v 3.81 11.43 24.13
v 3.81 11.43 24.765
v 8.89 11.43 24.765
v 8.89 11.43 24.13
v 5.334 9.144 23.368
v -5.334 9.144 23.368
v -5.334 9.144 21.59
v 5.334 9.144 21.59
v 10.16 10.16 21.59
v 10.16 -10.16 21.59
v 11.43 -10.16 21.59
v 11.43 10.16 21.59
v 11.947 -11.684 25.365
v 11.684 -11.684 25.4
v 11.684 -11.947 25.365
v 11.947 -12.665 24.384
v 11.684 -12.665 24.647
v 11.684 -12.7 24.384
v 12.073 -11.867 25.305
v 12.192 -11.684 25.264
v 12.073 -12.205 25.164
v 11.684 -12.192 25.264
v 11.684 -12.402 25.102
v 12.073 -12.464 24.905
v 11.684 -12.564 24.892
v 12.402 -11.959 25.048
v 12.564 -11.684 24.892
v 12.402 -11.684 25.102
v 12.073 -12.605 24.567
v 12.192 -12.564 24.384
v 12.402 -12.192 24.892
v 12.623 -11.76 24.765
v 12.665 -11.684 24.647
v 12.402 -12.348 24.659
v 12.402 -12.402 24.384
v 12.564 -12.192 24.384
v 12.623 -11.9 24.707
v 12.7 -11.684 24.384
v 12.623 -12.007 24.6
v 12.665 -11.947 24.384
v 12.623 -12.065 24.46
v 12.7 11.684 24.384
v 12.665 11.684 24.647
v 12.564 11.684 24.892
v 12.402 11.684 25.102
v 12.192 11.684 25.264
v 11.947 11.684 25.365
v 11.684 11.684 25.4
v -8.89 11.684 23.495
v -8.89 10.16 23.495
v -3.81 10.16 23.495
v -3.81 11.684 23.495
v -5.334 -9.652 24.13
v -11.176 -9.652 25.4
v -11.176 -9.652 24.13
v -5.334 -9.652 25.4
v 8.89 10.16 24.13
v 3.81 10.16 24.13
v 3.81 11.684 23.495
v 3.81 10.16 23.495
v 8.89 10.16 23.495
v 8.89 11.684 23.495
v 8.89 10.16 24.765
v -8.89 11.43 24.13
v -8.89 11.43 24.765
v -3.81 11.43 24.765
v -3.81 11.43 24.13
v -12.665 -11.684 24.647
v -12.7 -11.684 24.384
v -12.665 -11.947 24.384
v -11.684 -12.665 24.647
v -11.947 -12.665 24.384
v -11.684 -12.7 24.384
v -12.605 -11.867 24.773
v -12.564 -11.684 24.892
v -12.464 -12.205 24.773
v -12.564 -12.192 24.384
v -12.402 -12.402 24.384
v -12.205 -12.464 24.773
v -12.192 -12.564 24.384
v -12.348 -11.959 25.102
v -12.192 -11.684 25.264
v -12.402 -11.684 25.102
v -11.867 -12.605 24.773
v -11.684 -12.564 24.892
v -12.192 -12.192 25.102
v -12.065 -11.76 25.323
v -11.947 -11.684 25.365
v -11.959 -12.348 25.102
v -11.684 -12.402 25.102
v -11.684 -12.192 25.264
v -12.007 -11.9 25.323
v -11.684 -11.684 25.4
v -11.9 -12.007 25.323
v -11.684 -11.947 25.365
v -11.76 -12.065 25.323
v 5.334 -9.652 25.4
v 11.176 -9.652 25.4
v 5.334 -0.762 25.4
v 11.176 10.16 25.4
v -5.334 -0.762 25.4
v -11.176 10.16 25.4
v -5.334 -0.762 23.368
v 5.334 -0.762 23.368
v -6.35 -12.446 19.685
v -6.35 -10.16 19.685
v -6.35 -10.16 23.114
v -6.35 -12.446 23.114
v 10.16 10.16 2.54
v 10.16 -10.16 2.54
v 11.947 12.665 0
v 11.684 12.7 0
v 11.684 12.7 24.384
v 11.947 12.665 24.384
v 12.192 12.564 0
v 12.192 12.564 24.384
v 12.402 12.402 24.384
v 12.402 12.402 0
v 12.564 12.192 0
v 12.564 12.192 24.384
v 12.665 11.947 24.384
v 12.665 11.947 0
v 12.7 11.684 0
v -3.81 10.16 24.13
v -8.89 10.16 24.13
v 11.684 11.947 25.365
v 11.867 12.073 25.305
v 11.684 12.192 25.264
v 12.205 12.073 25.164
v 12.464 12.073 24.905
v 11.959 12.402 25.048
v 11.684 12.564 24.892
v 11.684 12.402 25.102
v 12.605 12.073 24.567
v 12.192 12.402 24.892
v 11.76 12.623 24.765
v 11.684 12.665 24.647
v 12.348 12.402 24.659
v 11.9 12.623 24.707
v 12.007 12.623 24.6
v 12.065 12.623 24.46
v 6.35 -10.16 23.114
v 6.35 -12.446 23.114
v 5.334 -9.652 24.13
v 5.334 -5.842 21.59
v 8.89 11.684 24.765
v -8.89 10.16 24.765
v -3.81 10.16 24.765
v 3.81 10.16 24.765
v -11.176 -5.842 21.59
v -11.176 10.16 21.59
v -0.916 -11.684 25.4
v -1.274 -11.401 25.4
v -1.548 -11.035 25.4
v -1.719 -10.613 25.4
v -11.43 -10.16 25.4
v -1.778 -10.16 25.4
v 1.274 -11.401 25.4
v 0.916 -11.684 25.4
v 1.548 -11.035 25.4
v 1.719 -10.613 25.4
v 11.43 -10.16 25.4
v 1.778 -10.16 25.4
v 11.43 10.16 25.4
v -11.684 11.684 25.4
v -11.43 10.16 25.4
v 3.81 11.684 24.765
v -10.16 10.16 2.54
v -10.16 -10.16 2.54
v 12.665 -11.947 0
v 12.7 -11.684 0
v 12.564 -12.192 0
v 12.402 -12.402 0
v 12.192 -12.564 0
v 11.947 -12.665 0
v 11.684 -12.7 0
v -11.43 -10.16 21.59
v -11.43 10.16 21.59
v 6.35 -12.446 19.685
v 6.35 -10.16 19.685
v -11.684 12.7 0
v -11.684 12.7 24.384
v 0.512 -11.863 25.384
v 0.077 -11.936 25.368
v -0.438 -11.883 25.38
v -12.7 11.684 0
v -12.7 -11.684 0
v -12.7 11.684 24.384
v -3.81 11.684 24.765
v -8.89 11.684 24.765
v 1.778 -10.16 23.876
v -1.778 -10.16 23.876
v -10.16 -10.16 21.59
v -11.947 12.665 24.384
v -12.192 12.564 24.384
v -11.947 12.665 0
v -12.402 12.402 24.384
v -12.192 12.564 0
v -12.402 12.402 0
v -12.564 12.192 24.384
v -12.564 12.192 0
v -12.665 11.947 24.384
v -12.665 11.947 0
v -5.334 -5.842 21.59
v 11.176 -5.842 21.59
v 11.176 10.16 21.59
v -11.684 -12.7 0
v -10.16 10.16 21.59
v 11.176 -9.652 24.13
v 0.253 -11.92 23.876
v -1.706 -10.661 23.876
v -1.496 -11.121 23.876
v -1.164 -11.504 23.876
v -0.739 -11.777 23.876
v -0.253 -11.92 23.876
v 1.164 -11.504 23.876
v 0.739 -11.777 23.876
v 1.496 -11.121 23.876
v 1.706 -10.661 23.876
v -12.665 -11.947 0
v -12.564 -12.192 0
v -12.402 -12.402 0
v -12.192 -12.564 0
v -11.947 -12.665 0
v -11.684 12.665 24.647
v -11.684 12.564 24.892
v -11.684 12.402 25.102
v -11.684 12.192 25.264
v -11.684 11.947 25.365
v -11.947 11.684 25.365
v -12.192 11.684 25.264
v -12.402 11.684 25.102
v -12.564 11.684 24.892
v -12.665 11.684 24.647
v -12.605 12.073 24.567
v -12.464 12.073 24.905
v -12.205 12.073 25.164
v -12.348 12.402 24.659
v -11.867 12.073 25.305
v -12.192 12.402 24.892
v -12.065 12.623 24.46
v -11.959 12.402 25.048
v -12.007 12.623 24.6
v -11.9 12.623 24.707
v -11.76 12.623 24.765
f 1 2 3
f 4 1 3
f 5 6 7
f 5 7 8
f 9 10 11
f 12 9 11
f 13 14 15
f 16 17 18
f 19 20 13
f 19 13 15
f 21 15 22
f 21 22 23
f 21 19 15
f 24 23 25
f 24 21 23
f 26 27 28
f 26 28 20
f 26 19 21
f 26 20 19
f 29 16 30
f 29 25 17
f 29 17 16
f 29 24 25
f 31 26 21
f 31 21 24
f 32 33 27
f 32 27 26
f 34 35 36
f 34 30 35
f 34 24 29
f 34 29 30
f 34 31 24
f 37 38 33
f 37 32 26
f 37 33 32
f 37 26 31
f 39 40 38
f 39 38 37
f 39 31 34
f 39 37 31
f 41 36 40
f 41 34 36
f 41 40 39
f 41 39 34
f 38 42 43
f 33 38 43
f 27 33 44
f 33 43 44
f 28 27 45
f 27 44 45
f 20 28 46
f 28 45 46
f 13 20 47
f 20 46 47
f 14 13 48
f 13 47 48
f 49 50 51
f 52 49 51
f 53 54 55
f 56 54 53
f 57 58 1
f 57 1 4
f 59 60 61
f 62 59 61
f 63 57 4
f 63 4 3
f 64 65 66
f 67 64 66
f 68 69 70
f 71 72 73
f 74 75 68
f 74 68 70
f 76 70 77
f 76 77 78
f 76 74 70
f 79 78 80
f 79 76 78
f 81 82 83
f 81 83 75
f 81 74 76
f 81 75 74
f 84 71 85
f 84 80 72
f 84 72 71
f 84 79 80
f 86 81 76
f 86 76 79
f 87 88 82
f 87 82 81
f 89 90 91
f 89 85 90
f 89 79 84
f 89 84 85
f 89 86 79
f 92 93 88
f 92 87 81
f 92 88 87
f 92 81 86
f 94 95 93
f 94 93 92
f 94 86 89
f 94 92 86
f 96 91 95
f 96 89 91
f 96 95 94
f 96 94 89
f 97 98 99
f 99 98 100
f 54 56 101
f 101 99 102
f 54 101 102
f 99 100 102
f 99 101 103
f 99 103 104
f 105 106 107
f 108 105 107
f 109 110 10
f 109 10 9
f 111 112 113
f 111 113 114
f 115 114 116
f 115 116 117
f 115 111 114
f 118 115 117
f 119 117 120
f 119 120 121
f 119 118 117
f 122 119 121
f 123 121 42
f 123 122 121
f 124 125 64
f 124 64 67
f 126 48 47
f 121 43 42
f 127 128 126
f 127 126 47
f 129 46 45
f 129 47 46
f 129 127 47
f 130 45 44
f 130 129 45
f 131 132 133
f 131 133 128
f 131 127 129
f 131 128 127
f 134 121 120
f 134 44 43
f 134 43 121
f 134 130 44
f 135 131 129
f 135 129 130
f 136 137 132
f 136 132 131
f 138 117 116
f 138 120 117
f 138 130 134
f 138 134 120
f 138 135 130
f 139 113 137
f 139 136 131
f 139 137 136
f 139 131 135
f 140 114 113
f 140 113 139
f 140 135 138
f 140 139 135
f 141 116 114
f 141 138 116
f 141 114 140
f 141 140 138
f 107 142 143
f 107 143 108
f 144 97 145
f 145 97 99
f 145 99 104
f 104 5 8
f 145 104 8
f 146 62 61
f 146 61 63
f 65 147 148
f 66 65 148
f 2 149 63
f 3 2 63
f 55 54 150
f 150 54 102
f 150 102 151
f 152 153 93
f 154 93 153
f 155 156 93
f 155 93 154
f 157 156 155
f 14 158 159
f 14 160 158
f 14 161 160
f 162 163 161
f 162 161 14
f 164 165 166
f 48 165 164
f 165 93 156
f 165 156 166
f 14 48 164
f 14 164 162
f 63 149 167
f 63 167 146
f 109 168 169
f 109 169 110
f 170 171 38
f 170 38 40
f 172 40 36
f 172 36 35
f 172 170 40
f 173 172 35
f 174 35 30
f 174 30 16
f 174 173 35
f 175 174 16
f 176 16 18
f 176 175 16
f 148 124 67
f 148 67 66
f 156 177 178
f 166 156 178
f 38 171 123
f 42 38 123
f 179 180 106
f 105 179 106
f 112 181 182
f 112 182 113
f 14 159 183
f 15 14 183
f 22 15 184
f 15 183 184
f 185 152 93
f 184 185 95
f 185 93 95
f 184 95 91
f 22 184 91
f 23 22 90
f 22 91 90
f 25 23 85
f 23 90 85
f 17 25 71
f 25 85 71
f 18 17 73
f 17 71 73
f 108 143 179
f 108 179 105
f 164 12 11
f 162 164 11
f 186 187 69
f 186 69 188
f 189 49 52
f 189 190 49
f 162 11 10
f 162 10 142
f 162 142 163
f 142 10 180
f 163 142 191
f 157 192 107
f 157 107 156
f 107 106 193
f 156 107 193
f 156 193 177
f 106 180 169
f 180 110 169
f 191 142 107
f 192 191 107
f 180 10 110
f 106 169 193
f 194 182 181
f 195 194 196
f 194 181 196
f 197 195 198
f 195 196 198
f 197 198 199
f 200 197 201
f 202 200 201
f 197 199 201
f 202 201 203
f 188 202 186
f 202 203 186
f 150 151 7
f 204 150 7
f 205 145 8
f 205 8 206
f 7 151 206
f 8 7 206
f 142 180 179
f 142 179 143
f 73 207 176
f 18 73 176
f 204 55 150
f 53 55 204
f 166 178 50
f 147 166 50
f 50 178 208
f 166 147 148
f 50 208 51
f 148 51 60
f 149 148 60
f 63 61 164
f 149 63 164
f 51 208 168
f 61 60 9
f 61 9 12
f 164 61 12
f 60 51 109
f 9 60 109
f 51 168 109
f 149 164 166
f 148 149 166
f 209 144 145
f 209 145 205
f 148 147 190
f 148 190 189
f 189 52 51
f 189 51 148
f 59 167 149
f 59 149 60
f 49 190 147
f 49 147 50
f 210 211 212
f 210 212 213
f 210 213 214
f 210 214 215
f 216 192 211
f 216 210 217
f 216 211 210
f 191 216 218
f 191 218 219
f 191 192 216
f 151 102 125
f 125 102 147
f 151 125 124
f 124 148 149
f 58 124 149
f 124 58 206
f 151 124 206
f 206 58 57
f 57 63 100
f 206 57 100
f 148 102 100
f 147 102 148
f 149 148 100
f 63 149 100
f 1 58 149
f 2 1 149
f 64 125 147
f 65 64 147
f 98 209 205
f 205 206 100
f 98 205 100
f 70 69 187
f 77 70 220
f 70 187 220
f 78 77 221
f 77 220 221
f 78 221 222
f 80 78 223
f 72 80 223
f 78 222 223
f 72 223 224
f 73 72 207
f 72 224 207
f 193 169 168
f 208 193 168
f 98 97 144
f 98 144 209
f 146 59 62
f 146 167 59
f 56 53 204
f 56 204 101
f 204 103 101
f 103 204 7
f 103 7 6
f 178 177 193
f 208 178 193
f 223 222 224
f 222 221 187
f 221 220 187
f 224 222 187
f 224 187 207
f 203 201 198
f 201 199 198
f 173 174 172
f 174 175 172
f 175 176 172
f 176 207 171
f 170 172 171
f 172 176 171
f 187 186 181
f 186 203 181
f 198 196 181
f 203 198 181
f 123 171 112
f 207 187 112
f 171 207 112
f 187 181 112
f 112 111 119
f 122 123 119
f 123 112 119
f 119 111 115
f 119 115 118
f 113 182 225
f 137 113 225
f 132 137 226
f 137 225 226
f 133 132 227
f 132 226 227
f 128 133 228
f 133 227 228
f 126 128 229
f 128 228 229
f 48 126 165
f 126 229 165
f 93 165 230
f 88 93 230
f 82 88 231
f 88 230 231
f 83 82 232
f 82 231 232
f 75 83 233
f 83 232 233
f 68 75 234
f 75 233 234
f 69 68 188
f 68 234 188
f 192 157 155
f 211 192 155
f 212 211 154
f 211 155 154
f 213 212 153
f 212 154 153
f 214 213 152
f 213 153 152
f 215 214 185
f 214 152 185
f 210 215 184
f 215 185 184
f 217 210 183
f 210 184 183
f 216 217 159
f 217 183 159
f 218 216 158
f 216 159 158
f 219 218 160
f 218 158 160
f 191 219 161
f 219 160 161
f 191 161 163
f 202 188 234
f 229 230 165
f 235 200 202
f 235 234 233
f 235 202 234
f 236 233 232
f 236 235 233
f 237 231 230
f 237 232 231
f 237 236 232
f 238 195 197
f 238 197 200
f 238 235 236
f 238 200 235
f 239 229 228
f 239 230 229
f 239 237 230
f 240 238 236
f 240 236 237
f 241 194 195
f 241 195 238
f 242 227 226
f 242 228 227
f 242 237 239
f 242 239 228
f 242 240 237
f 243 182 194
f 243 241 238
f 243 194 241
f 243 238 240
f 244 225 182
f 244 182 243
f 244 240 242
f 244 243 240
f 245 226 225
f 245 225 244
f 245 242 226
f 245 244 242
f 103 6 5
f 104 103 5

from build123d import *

# Parameters (mm, degrees)
F0_W          = 25.4
F0_H          = 25.4
F1_DEPTH      = 25.4
F0_W_2        = 1.27
F0_H_2        = 20.32
F0_W_3        = 20.32
F2_DEPTH      = 2.54
F3_DEPTH      = 21.59
F4_W          = 28.194
F4_H          = 28.194
F4_W_2        = 25.654
F4_H_2        = 25.654
F4_W_3        = 25.4
F4_H_3        = 25.4
F4_W_4        = 22.86
F4_H_4        = 20.32
F5_DEPTH      = 1.27
F6_DEPTH      = 2.54
F8_W          = 5.08
F8_H          = 0.635
F9_DEPTH      = 1.524
F10_W         = 12.7
F10_H         = 3.429
F11_DEPTH     = 2.286
F13_DEPTH     = 1.524
F14_DEPTH     = 1.27
F15_DEPTH     = 19.812
F8_W_2        = 10.668
F8_H_2        = 1.778
F16_DEPTH     = 1.016
F17_W         = 10.668
F17_H         = 8.89
F18_DEPTH     = 5.08
F19_C1_SIZE2  = 2.54
F19_C1_SIZE   = 3.81
F19_C2_SIZE2  = 2.54
F19_C2_SIZE   = 3.81
F20_T1_DEPTH  = 26.924
F20_T3_DEPTH  = 23.368
F20_T5_DEPTH  = 23.368
F20_S9_W      = 1.016
F20_S9_H      = 1.016
F20_T10_DEPTH = 1.016
F20_S15_W     = 1.016
F20_S15_H     = 1.016
F20_T16_DEPTH = 1.016
F20_S21_W     = 1.016
F20_S21_H     = 1.016
F20_T22_DEPTH = 1.016
F20_S27_W     = 1.016
F20_S27_H     = 1.016
F20_T28_DEPTH = 1.016


# Not quite as in the source:
# - a fillet or chamfer that OpenCascade refuses, or shapes differently, is made with other operations: its cross-section is extruded or revolved along the edge and cut away or added


with BuildPart() as f1:
    # F0 (on Top) → F1 (new body)
    with BuildSketch(Plane.XY):
        Rectangle(F0_W, F0_H)
        Polygon((10.16, 10.16), (11.43, 10.16), (11.43, -10.16), (10.16, -10.16), (-10.16, -10.16), (-11.43, -10.16), (-11.43, 10.16), (-10.16, 10.16), align=None, mode=Mode.SUBTRACT)
    extrude(amount=F1_DEPTH)

    # F0 (on Top) → F2 (join)
    with BuildSketch(Plane.XY):
        Rectangle(F0_W, F0_H)
        Polygon((10.16, 10.16), (11.43, 10.16), (11.43, -10.16), (10.16, -10.16), (-10.16, -10.16), (-11.43, -10.16), (-11.43, 10.16), (-10.16, 10.16), align=None, mode=Mode.SUBTRACT)
        with Locations((10.795, 0)):
            Rectangle(F0_W_2, F0_H_2)
        Rectangle(F0_W_3, F0_H_2)
        with Locations((-10.795, 0)):
            Rectangle(F0_W_2, F0_H_2)
    extrude(amount=F2_DEPTH)

    # F0 (on Top) → F3 (join)
    with BuildSketch(Plane.XY):
        with Locations((-10.795, 0)):
            Rectangle(F0_W_2, F0_H_2)
        with Locations((10.795, 0)):
            Rectangle(F0_W_2, F0_H_2)
    extrude(amount=F3_DEPTH)

    # F8 (on face) → F9 (cut)
    with BuildSketch(Plane.XZ.offset(-10.16)):
        with Locations((-6.35, 23.8125)):
            Rectangle(F8_W, F8_H)
        with Locations((-6.35, 24.4475)):
            Rectangle(F8_W, F8_H)
        with Locations((6.35, 23.8125)):
            Rectangle(F8_W, F8_H)
        with Locations((6.35, 24.4475)):
            Rectangle(F8_W, F8_H)
    extrude(amount=-F9_DEPTH, mode=Mode.SUBTRACT)

    # F10 (on face) → F11 (cut)
    with BuildSketch(Plane(origin=(0, -10.16, 0), x_dir=(-1, 0, 0), z_dir=(0, 1, 0))):
        with Locations((0, 21.3995)):
            Rectangle(F10_W, F10_H)
    extrude(amount=-F11_DEPTH, mode=Mode.SUBTRACT)

    # F12 (on face) → F13 (cut)
    with BuildSketch(Plane.XY.offset(25.4)):
        with BuildLine():
            Line((1.778, -10.16), (-1.778, -10.16))
            ThreePointArc((-1.778, -10.16), (0, -11.938), (1.778, -10.16))
        make_face()
    extrude(amount=-F13_DEPTH, mode=Mode.SUBTRACT)

    # F20: fillet of radius 1.016 on 8 edges, made by hand

    # F20_s2 → F20_t1 (cut)
    with BuildSketch(Plane.XY.offset(-2.54)):
        with BuildLine():
            ThreePointArc((12.7, -11.684), (12.4024204897, -12.4024204897), (11.684, -12.7))
            Line((11.684, -12.7), (12.7, -12.7))
            Line((12.7, -12.7), (12.7, -11.684))
        make_face()
        with BuildLine():
            ThreePointArc((-12.7, -11.684), (-12.4024204897, -12.4024204897), (-11.684, -12.7))
            Line((-11.684, -12.7), (-12.7, -12.7))
            Line((-12.7, -12.7), (-12.7, -11.684))
        make_face()
        with BuildLine():
            ThreePointArc((11.684, 12.7), (12.4024204897, 12.4024204897), (12.7, 11.684))
            Line((12.7, 11.684), (12.7, 12.7))
            Line((12.7, 12.7), (11.684, 12.7))
        make_face()
        with BuildLine():
            ThreePointArc((-11.684, 12.7), (-12.4024204897, 12.4024204897), (-12.7, 11.684))
            Line((-12.7, 11.684), (-12.7, 12.7))
            Line((-12.7, 12.7), (-11.684, 12.7))
        make_face()
    extrude(amount=F20_T1_DEPTH, mode=Mode.SUBTRACT)

    # F20_s4 → F20_t3 (cut)
    with BuildSketch(Plane.XZ.offset(-11.684)):
        with BuildLine():
            ThreePointArc((12.7, 24.384), (12.4024204897, 25.1024204897), (11.684, 25.4))
            Line((11.684, 25.4), (12.7, 25.4))
            Line((12.7, 25.4), (12.7, 24.384))
        make_face()
        with BuildLine():
            ThreePointArc((-11.684, 25.4), (-12.4024204897, 25.1024204897), (-12.7, 24.384))
            Line((-12.7, 24.384), (-12.7, 25.4))
            Line((-12.7, 25.4), (-11.684, 25.4))
        make_face()
    extrude(amount=F20_T3_DEPTH, mode=Mode.SUBTRACT)

    # F20_s6 → F20_t5 (cut)
    with BuildSketch(Plane.YZ.offset(-11.684)):
        with BuildLine():
            ThreePointArc((-11.684, 25.4), (-12.4024204897, 25.1024204897), (-12.7, 24.384))
            Line((-12.7, 24.384), (-12.7, 25.4))
            Line((-12.7, 25.4), (-11.684, 25.4))
        make_face()
        with BuildLine():
            ThreePointArc((12.7, 24.384), (12.4024204897, 25.1024204897), (11.684, 25.4))
            Line((11.684, 25.4), (12.7, 25.4))
            Line((12.7, 25.4), (12.7, 24.384))
        make_face()
    extrude(amount=F20_T5_DEPTH, mode=Mode.SUBTRACT)


with BuildPart() as f5:
    # F4 (on face) → F5 (new body)
    with BuildSketch(Plane.XY.offset(25.4)):
        Rectangle(F4_W, F4_H)
        Rectangle(F4_W_2, F4_H_2, mode=Mode.SUBTRACT)
        Rectangle(F4_W_2, F4_H_2)
        Rectangle(F4_W_3, F4_H_3, mode=Mode.SUBTRACT)
        Rectangle(F4_W_3, F4_H_3)
        Rectangle(F4_W_4, F4_H_4, mode=Mode.SUBTRACT)
        Rectangle(F4_W_4, F4_H_4)
    extrude(amount=F5_DEPTH)

    # F4 (on face) → F6 (join)
    with BuildSketch(Plane.XY.offset(25.4)):
        Rectangle(F4_W, F4_H)
        Rectangle(F4_W_2, F4_H_2, mode=Mode.SUBTRACT)
    extrude(amount=-F6_DEPTH)


with BuildPart() as f14:
    # F8 (on face) → F14 (new body)
    with BuildSketch(Plane.XZ.offset(-10.16)):
        with Locations((6.35, 24.4475)):
            Rectangle(F8_W, F8_H)
    extrude(amount=-F14_DEPTH)



with BuildPart() as f14b:
    # F8 (on face) → F14, piece 2 (new body)
    with BuildSketch(Plane.XZ.offset(-10.16)):
        with Locations((-6.35, 24.4475)):
            Rectangle(F8_W, F8_H)
    extrude(amount=-F14_DEPTH)


with BuildPart() as f14_1:
    add(f14.part)

    add(f14b.part)  # F15 merges F14b
    # F8 (on face) → F15 (join)
    with BuildSketch(Plane.XZ.offset(-10.16)):
        Polygon((-5.334, 23.368), (5.334, 23.368), (5.334, 21.59), (10.16, 21.59), (11.176, 21.59), (11.176, 25.4), (-11.176, 25.4), (-11.176, 21.59), (-10.16, 21.59), (-5.334, 21.59), align=None)
        Polygon((-8.89, 24.13), (-8.89, 24.765), (-3.81, 24.765), (-3.81, 24.13), (-3.81, 23.495), (-8.89, 23.495), align=None, mode=Mode.SUBTRACT)
        Polygon((3.81, 24.13), (3.81, 24.765), (8.89, 24.765), (8.89, 24.13), (8.89, 23.495), (3.81, 23.495), align=None, mode=Mode.SUBTRACT)
        with Locations((6.35, 24.4475)):
            Rectangle(F8_W, F8_H)
        with Locations((6.35, 23.8125)):
            Rectangle(F8_W, F8_H)
        with Locations((-6.35, 24.4475)):
            Rectangle(F8_W, F8_H)
        with Locations((-6.35, 23.8125)):
            Rectangle(F8_W, F8_H)
    extrude(amount=F15_DEPTH)

    # F8 (on face) → F16 (join)
    with BuildSketch(Plane.XZ.offset(-10.16)):
        with Locations((0, 22.479)):
            Rectangle(F8_W_2, F8_H_2)
    extrude(amount=F16_DEPTH)

    # F17 (on face) → F18 (cut)
    with BuildSketch(Plane.XY.offset(25.4)):
        with Locations((0, -5.207)):
            Rectangle(F17_W, F17_H)
    extrude(amount=-F18_DEPTH, mode=Mode.SUBTRACT)

    # F19: chamfer of 2.54 x 3.81 on 2 edges, made by hand

    # F19_c1
    f19_c1_edges = [f14_1.edges().sort_by_distance(p)[0] for p in [
        (8.255, -9.652, 21.59),
    ]]
    f19_c1_side = f14_1.faces().sort_by_distance((8.255, -9.6012, 21.59))[0]
    chamfer(f19_c1_edges, length=F19_C1_SIZE, length2=F19_C1_SIZE2, reference=f19_c1_side)

    # F19_c2
    f19_c2_edges = [f14_1.edges().sort_by_distance(p)[0] for p in [
        (-8.255, -9.652, 21.59),
    ]]
    f19_c2_side = f14_1.faces().sort_by_distance((-8.255, -9.6012, 21.59))[0]
    chamfer(f19_c2_edges, length=F19_C2_SIZE, length2=F19_C2_SIZE2, reference=f19_c2_side)


with BuildPart() as f20_tool8:
    # F20_s9 → F20_t10 (new body)
    with BuildSketch(Plane.YZ.offset(11.684)):
        with Locations((-12.192, 24.892)):
            Rectangle(F20_S9_W, F20_S9_H)
    extrude(amount=F20_T10_DEPTH)

    # F20_s11 → F20_t12 (revolve, cut)
    with BuildSketch(Plane(origin=(11.684, -11.684, 24.384), x_dir=(0, 0.7071067812, -0.7071067812), z_dir=(0, -0.7071067812, -0.7071067812))):
        with BuildLine():
            ThreePointArc((0, -1.016), (1.016, 0), (0, 1.016))
            Line((0, 1.016), (0, -1.016))
        make_face()
    revolve(axis=Axis((11.684, -11.684, 24.384), (1, 0, 0)), mode=Mode.SUBTRACT)


with BuildPart() as f1_1:
    add(f1.part)

    # F20_t7: cut F20_tool8
    add(f20_tool8.part, mode=Mode.SUBTRACT)


with BuildPart() as f20_tool14:
    # F20_s15 → F20_t16 (new body)
    with BuildSketch(Plane.XZ.offset(-11.684)):
        with Locations((12.192, 24.892)):
            Rectangle(F20_S15_W, F20_S15_H)
    extrude(amount=-F20_T16_DEPTH)

    # F20_s17 → F20_t18 (revolve, cut)
    with BuildSketch(Plane(origin=(11.684, 11.684, 24.384), x_dir=(-0.7071067812, 0, -0.7071067812), z_dir=(0.7071067812, 0, -0.7071067812))):
        with BuildLine():
            ThreePointArc((0, -1.016), (1.016, 0), (0, 1.016))
            Line((0, 1.016), (0, -1.016))
        make_face()
    revolve(axis=Axis((11.684, 11.684, 24.384), (0, 1, 0)), mode=Mode.SUBTRACT)


with BuildPart() as f1_2:
    add(f1_1.part)

    # F20_t13: cut F20_tool14
    add(f20_tool14.part, mode=Mode.SUBTRACT)


with BuildPart() as f20_tool20:
    # F20_s21 → F20_t22 (new body)
    with BuildSketch(Plane.XY.offset(24.384)):
        with Locations((-12.192, -12.192)):
            Rectangle(F20_S21_W, F20_S21_H)
    extrude(amount=F20_T22_DEPTH)

    # F20_s23 → F20_t24 (revolve, cut)
    with BuildSketch(Plane(origin=(-11.684, -11.684, 24.384), x_dir=(0.7071067812, 0.7071067812, 0), z_dir=(0.7071067812, -0.7071067812, 0))):
        with BuildLine():
            ThreePointArc((0, -1.016), (1.016, 0), (0, 1.016))
            Line((0, 1.016), (0, -1.016))
        make_face()
    revolve(axis=Axis((-11.684, -11.684, 24.384), (0, 0, 1)), mode=Mode.SUBTRACT)


with BuildPart() as f1_3:
    add(f1_2.part)

    # F20_t19: cut F20_tool20
    add(f20_tool20.part, mode=Mode.SUBTRACT)


with BuildPart() as f20_tool26:
    # F20_s27 → F20_t28 (new body)
    with BuildSketch(Plane.XZ.offset(-11.684)):
        with Locations((-12.192, 24.892)):
            Rectangle(F20_S27_W, F20_S27_H)
    extrude(amount=-F20_T28_DEPTH)

    # F20_s29 → F20_t30 (revolve, cut)
    with BuildSketch(Plane(origin=(-11.684, 11.684, 24.384), x_dir=(0.7071067812, 0, -0.7071067812), z_dir=(0.7071067812, 0, 0.7071067812))):
        with BuildLine():
            ThreePointArc((0, -1.016), (1.016, 0), (0, 1.016))
            Line((0, 1.016), (0, -1.016))
        make_face()
    revolve(axis=Axis((-11.684, 11.684, 24.384), (0, 1, 0)), mode=Mode.SUBTRACT)


with BuildPart() as f1_4:
    add(f1_3.part)

    # F20_t25: cut F20_tool26
    add(f20_tool26.part, mode=Mode.SUBTRACT)


solid = Compound([f14_1.part, f1_4.part])
